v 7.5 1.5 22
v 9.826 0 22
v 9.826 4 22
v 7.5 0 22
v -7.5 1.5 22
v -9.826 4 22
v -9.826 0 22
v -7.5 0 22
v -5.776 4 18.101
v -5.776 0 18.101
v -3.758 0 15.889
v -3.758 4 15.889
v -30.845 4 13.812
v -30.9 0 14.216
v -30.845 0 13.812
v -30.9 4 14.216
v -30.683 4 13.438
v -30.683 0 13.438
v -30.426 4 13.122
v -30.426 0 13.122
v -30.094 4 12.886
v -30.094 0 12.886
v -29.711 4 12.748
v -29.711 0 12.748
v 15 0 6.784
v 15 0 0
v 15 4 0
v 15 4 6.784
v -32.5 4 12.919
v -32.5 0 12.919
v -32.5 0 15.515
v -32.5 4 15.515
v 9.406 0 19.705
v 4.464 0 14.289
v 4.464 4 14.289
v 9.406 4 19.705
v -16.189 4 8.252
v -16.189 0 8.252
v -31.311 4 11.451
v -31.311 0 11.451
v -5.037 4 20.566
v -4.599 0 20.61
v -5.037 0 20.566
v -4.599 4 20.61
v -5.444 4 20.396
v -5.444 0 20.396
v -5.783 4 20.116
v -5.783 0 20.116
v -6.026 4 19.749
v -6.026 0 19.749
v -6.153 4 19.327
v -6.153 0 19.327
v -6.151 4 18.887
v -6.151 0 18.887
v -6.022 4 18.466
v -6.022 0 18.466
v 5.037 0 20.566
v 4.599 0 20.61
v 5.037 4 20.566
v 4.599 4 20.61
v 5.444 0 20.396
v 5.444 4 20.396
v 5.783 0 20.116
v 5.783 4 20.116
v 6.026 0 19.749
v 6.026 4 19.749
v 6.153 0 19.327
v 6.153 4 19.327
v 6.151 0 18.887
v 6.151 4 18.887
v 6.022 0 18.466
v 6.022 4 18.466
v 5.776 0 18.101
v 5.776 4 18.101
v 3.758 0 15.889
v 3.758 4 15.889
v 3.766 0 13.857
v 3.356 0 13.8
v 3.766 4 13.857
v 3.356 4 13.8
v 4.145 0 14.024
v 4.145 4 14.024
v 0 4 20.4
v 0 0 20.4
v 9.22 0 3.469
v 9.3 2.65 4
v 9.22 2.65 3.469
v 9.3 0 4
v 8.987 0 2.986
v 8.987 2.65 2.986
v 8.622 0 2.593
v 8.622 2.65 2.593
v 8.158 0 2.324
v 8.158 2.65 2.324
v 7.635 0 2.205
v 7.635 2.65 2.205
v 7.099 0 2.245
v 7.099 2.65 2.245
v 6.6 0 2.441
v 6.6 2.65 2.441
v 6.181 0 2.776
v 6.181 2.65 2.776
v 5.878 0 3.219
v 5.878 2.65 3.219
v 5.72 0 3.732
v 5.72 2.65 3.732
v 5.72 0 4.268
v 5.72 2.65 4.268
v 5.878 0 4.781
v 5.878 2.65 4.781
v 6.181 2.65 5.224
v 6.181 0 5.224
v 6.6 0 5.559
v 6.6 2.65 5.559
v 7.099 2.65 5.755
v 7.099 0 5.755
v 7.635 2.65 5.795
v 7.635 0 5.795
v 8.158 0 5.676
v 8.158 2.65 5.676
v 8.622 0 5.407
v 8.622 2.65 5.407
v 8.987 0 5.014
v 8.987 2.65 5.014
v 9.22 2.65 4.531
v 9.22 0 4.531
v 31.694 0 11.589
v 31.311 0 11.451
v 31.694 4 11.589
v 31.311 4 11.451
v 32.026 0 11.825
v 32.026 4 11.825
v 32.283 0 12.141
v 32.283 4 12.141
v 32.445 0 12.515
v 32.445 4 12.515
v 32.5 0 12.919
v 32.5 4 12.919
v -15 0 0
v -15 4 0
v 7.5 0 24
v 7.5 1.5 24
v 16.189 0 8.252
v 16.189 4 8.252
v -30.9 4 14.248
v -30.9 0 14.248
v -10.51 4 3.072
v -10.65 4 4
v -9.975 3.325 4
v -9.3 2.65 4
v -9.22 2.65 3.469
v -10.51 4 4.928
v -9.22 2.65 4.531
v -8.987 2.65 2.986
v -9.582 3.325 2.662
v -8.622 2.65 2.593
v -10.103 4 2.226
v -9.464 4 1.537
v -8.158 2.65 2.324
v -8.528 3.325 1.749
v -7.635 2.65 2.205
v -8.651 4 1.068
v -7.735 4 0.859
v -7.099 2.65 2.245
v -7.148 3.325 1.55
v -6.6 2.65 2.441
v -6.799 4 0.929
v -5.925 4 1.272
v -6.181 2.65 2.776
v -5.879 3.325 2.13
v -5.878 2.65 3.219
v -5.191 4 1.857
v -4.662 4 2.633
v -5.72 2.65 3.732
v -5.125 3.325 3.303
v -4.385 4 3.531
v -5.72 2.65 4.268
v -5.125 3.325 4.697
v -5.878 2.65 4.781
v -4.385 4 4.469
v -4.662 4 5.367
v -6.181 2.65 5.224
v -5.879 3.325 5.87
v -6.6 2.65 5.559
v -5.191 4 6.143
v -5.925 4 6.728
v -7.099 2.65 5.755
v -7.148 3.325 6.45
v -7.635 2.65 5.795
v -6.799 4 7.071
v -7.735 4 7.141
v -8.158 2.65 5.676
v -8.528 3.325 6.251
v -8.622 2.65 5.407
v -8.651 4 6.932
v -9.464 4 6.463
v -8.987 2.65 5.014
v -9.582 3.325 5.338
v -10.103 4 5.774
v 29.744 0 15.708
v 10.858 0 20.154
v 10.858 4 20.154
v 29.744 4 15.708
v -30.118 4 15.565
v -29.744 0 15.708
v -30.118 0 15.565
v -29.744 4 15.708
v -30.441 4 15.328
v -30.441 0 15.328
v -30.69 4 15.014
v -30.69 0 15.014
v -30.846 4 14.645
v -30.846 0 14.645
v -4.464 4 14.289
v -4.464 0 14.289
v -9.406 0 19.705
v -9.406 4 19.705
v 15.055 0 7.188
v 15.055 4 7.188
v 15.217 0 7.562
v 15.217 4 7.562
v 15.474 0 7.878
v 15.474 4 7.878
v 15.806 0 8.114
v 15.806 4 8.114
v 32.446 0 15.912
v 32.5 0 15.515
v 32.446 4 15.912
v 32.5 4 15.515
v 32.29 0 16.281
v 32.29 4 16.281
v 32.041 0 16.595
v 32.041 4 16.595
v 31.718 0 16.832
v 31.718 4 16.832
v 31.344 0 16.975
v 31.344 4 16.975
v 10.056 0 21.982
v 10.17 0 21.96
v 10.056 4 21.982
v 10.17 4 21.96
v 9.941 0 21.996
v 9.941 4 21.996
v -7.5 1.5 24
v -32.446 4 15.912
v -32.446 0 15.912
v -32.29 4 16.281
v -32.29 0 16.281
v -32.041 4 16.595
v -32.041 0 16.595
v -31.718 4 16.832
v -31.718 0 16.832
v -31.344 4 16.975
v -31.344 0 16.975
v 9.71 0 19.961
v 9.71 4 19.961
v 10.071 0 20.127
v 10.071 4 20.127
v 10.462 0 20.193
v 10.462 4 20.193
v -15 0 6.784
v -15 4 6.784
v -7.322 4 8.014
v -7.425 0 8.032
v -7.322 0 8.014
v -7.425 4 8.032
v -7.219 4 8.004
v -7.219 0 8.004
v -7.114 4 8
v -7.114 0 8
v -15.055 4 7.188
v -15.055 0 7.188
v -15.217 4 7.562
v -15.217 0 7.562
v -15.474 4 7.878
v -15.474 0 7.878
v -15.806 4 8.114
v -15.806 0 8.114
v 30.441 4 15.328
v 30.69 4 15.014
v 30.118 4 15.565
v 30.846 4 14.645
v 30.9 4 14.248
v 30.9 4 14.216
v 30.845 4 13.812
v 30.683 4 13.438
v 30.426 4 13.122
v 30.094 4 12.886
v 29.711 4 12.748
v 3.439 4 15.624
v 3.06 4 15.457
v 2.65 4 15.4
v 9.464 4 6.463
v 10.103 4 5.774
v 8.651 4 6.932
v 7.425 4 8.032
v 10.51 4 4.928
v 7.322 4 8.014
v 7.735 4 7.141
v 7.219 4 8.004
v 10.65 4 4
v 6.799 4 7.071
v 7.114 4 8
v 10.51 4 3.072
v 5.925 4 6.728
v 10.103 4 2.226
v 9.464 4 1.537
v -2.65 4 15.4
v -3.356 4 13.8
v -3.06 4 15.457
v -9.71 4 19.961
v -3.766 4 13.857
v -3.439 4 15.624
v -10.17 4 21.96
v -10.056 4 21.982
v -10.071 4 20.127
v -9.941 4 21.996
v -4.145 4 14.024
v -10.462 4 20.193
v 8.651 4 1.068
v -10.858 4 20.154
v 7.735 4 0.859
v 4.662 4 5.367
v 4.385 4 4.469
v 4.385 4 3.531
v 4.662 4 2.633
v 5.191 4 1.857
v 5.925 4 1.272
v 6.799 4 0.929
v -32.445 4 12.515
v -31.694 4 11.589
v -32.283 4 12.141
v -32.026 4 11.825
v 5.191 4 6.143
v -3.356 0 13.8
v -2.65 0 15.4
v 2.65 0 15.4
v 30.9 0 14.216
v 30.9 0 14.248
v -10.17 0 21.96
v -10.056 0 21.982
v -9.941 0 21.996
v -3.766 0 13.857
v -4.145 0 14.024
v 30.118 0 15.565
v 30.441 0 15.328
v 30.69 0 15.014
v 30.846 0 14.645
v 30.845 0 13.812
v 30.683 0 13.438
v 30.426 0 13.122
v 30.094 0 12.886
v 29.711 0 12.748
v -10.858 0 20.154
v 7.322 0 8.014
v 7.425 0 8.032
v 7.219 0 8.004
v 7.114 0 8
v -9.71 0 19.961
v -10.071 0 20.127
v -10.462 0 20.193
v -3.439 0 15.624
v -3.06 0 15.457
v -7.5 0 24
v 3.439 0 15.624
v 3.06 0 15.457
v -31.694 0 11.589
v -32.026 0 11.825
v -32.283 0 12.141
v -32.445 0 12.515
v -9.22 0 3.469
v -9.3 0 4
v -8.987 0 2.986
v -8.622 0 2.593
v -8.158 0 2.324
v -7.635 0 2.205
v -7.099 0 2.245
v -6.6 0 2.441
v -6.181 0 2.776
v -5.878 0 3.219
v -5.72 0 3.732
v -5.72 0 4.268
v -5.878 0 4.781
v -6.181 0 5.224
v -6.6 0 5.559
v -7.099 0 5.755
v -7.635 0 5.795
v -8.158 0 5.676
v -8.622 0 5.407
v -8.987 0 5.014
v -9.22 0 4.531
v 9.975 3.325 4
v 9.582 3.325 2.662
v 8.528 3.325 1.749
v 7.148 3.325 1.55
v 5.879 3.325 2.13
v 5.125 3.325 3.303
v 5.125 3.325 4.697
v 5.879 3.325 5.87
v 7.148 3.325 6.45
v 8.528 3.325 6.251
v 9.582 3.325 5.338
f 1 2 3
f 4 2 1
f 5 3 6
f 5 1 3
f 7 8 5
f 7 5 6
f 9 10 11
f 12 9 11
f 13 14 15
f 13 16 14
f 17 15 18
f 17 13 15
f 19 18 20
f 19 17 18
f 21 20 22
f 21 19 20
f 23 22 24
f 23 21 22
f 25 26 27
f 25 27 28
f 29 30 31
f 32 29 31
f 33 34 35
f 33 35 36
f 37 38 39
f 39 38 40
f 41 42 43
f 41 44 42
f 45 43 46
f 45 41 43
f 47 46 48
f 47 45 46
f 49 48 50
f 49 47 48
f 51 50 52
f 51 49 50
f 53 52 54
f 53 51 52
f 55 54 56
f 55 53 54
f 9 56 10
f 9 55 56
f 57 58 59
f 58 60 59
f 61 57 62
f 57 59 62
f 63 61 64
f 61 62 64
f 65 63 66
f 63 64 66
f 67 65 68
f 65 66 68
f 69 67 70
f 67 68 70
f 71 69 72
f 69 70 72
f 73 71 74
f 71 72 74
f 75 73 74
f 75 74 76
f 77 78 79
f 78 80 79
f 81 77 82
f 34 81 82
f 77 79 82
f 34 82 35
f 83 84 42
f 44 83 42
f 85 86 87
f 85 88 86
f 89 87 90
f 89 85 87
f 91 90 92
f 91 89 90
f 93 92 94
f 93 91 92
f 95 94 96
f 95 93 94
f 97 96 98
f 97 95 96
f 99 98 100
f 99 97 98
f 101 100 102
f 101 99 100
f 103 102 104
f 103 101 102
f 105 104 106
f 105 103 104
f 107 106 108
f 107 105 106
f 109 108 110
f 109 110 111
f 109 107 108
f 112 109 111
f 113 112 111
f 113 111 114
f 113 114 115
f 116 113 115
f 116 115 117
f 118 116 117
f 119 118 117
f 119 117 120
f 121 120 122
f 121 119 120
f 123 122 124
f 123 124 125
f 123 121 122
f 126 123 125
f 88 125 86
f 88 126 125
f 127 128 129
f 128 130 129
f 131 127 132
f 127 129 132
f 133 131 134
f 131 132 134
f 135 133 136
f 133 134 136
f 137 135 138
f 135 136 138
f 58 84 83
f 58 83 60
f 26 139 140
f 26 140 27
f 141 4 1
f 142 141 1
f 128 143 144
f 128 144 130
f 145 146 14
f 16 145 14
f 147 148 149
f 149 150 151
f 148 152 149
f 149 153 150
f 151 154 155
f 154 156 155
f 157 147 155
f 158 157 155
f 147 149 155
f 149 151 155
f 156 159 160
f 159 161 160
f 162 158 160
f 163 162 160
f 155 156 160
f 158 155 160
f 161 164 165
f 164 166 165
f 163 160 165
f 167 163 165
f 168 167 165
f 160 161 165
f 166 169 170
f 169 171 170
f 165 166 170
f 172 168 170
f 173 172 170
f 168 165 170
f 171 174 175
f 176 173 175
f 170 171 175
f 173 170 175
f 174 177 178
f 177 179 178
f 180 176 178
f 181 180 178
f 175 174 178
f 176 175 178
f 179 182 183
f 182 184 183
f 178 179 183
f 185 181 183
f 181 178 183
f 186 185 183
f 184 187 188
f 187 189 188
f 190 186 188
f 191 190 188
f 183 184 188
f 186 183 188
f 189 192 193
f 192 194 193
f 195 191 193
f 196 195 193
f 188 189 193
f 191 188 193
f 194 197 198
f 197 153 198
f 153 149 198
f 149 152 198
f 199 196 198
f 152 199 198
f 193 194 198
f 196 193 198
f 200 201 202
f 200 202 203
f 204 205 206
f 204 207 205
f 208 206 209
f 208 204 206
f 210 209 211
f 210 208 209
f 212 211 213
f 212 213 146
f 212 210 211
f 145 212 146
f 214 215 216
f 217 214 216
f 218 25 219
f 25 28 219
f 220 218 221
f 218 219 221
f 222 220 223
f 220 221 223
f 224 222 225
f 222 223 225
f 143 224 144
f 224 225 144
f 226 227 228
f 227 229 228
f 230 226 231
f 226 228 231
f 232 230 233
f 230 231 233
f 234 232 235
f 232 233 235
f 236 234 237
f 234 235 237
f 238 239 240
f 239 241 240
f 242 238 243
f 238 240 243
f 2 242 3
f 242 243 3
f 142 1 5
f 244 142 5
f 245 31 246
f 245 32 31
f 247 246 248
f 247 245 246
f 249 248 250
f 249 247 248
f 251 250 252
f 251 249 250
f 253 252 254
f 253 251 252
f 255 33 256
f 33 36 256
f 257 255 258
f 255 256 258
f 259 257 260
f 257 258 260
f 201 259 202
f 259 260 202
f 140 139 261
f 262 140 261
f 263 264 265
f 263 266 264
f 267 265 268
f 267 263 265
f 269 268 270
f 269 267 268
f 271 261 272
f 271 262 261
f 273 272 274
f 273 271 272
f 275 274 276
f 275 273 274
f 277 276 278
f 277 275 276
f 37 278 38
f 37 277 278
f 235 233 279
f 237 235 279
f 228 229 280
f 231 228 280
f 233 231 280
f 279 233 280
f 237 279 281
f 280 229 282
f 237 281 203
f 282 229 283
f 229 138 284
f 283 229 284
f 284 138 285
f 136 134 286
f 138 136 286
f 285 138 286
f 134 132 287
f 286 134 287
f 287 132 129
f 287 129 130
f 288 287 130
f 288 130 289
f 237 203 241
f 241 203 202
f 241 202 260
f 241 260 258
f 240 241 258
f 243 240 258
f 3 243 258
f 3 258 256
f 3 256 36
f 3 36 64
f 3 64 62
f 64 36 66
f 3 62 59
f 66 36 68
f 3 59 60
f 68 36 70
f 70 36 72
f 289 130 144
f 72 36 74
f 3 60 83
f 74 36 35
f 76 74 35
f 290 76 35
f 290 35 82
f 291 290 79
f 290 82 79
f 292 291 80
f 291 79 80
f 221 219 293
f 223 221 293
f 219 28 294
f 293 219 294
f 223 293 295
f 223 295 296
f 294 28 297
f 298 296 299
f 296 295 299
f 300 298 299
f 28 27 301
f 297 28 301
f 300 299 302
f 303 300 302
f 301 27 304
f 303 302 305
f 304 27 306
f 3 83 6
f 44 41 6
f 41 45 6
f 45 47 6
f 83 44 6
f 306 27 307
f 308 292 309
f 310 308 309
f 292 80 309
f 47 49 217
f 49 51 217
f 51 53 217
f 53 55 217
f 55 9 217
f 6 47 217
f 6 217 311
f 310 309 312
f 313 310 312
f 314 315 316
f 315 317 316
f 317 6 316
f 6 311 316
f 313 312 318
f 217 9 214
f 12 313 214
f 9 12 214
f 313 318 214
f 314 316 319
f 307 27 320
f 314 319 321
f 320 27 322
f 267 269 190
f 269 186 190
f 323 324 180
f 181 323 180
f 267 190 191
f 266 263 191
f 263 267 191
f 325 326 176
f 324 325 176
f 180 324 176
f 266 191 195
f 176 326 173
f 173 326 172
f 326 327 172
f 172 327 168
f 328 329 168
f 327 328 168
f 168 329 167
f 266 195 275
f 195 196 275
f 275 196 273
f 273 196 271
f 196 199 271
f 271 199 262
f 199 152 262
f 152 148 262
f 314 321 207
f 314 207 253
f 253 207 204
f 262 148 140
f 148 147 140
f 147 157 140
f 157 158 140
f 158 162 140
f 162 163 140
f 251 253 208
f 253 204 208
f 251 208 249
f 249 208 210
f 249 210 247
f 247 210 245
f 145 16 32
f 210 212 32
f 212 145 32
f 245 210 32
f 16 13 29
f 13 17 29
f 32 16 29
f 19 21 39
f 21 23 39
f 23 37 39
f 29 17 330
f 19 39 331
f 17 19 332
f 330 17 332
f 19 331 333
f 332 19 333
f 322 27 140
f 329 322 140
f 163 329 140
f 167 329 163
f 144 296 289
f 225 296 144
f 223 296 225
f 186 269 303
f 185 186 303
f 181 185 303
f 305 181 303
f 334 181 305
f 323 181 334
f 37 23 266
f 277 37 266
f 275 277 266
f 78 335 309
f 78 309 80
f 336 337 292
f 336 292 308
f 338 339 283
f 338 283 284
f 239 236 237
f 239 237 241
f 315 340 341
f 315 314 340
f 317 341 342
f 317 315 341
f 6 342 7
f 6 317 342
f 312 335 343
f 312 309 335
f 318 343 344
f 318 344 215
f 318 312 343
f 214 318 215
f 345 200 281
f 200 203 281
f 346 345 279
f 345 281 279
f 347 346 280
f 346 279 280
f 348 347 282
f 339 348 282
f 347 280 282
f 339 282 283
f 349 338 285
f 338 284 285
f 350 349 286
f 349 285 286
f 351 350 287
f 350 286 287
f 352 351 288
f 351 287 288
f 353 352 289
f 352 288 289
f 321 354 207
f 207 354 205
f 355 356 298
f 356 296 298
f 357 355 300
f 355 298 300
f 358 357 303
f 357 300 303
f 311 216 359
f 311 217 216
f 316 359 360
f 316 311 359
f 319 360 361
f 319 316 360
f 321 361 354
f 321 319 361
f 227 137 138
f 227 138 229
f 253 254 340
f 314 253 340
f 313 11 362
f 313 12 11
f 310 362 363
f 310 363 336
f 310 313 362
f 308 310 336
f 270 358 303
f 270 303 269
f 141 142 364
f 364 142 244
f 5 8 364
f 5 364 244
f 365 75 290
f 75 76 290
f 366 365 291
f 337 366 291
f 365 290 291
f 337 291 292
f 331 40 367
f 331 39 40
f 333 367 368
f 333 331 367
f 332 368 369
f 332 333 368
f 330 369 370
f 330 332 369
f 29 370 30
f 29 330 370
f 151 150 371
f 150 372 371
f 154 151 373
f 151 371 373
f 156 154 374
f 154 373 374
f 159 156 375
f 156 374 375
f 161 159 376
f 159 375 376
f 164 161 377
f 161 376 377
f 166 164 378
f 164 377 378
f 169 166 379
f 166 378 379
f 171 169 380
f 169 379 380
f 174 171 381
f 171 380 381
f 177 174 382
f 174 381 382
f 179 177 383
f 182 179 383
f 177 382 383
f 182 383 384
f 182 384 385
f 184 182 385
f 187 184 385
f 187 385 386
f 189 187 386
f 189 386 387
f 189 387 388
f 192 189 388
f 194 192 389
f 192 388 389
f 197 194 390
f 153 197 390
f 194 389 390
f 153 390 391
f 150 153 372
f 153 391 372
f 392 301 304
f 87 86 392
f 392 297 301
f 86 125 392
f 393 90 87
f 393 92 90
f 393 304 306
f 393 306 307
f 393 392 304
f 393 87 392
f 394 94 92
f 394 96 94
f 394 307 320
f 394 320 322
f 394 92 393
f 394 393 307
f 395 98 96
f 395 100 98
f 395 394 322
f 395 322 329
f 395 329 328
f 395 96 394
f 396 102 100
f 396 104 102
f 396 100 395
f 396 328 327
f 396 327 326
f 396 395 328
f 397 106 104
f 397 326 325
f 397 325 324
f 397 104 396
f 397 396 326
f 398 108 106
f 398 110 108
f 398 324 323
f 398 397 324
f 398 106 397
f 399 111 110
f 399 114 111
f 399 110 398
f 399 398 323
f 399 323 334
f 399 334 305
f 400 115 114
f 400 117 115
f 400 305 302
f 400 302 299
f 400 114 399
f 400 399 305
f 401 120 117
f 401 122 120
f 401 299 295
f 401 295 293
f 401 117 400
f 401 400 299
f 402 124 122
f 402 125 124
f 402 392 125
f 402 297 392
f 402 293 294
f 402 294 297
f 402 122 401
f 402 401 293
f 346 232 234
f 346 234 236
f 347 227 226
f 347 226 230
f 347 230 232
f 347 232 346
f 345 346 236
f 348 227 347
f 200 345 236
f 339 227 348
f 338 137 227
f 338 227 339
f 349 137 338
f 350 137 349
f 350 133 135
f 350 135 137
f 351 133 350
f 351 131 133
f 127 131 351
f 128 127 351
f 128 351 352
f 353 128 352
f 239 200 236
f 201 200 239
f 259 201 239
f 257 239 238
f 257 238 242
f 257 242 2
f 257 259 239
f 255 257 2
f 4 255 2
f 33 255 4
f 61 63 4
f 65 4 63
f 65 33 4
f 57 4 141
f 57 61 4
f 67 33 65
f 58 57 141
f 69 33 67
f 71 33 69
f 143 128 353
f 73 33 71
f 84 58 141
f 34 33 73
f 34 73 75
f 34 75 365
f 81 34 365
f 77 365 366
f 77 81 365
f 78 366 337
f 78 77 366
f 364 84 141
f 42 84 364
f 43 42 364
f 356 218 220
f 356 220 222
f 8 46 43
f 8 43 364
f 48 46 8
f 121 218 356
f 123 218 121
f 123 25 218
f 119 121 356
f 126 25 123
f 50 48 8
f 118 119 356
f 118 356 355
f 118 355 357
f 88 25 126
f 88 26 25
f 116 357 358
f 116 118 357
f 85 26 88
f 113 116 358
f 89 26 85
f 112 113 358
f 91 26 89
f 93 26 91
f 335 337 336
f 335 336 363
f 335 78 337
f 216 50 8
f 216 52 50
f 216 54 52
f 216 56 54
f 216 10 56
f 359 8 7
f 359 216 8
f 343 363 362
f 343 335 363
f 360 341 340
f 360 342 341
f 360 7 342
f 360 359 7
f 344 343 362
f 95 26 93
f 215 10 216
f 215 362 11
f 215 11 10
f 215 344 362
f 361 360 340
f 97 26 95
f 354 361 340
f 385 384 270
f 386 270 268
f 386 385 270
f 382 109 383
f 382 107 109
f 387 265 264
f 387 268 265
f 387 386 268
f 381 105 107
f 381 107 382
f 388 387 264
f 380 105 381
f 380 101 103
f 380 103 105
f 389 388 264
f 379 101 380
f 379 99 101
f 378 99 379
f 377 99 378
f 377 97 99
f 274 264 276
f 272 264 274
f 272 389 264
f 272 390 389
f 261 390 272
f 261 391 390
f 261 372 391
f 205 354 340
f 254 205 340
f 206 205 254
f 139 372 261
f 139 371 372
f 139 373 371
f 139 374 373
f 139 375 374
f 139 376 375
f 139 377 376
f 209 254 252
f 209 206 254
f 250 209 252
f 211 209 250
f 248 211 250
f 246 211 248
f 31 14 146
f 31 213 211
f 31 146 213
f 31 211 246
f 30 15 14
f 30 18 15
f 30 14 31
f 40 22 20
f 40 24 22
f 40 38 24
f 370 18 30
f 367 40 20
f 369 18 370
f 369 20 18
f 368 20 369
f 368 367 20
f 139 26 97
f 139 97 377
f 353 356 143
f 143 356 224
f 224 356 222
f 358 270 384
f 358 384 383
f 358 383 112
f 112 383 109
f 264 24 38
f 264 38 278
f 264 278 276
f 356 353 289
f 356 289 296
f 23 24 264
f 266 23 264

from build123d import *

# Parameters (mm, degrees)
BOSS_EXTRUDE1_DEPTH                                 = 4
FILLET1_R                                           = 1.5
CSK_FOR_M3_COUNTERSUNK_FLAT_HEAD_SCREW1_D           = 3.6
CSK_FOR_M3_COUNTERSUNK_FLAT_HEAD_SCREW1_CSINK_D     = 6.3
CSK_FOR_M3_COUNTERSUNK_FLAT_HEAD_SCREW1_CSINK_ANGLE = 90
SKETCH5_W                                           = 7.5
SKETCH5_H                                           = 1.5
BOSS_EXTRUDE2_DEPTH                                 = 2


with BuildPart() as part:
    # Sketch1 → Boss-Extrude1 (new body)
    with BuildSketch(Plane(origin=(0, 0, 0), x_dir=(1, 0, 0), z_dir=(0, 1, 0))):
        Polygon((0, 0), (-15, 0), (-15, -8), (-32.5, -11.703142934), (-32.5, -16.703142934), (-10, -22), (0, -22), (0, -20.4), (-8.217014563, -20.776004397), (-3.311485397, -15.4), (0, -15.4), (0, -13.8), (-4.017502815, -13.8), (-10, -20.356261329), (-30.9, -15.436069655), (-30.9, -13), (-7.271422452, -8), (0, -8), align=None)
    extrude(amount=BOSS_EXTRUDE1_DEPTH)

    # Fillet1
    fillet1_edges = [part.edges().sort_by_distance(p)[0] for p in [
        (-7.271422452, 2, 8),
        (-30.9, 2, 13),
        (-30.9, 2, 15.436069655),
        (-10, 2, 20.356261329),
        (-4.017502815, 2, 13.8),
        (-3.311485397, 2, 15.4),
        (-8.217014563, 2, 20.776004397),
        (-10, 2, 22),
        (-32.5, 2, 16.703142934),
        (-32.5, 2, 11.703142934),
        (-15, 2, 8),
    ]]
    fillet(fillet1_edges, radius=FILLET1_R)

    # CSK for M3 Countersunk Flat Head Screw1 (through all)
    with Locations(Plane(origin=(0, 4, 0), x_dir=(1, 0, 0), z_dir=(0, 1, 0))):
        with Locations((-7.5, -4)):
            CounterSinkHole(CSK_FOR_M3_COUNTERSUNK_FLAT_HEAD_SCREW1_D / 2, CSK_FOR_M3_COUNTERSUNK_FLAT_HEAD_SCREW1_CSINK_D / 2, counter_sink_angle=CSK_FOR_M3_COUNTERSUNK_FLAT_HEAD_SCREW1_CSINK_ANGLE)

    # Sketch5 → Boss-Extrude2 (add)
    with BuildSketch(Plane.XY.offset(22)):
        with Locations((-3.75, 0.75)):
            Rectangle(SKETCH5_W, SKETCH5_H)
    extrude(amount=BOSS_EXTRUDE2_DEPTH)

    # Mirror1: part across plane


with BuildPart() as part_1:
    add(part.part)
    add(part.part.mirror(Plane(origin=(0, 4, 8), x_dir=(0, 0, 1), z_dir=(-1, 0, 0))))


solid = part_1.part
